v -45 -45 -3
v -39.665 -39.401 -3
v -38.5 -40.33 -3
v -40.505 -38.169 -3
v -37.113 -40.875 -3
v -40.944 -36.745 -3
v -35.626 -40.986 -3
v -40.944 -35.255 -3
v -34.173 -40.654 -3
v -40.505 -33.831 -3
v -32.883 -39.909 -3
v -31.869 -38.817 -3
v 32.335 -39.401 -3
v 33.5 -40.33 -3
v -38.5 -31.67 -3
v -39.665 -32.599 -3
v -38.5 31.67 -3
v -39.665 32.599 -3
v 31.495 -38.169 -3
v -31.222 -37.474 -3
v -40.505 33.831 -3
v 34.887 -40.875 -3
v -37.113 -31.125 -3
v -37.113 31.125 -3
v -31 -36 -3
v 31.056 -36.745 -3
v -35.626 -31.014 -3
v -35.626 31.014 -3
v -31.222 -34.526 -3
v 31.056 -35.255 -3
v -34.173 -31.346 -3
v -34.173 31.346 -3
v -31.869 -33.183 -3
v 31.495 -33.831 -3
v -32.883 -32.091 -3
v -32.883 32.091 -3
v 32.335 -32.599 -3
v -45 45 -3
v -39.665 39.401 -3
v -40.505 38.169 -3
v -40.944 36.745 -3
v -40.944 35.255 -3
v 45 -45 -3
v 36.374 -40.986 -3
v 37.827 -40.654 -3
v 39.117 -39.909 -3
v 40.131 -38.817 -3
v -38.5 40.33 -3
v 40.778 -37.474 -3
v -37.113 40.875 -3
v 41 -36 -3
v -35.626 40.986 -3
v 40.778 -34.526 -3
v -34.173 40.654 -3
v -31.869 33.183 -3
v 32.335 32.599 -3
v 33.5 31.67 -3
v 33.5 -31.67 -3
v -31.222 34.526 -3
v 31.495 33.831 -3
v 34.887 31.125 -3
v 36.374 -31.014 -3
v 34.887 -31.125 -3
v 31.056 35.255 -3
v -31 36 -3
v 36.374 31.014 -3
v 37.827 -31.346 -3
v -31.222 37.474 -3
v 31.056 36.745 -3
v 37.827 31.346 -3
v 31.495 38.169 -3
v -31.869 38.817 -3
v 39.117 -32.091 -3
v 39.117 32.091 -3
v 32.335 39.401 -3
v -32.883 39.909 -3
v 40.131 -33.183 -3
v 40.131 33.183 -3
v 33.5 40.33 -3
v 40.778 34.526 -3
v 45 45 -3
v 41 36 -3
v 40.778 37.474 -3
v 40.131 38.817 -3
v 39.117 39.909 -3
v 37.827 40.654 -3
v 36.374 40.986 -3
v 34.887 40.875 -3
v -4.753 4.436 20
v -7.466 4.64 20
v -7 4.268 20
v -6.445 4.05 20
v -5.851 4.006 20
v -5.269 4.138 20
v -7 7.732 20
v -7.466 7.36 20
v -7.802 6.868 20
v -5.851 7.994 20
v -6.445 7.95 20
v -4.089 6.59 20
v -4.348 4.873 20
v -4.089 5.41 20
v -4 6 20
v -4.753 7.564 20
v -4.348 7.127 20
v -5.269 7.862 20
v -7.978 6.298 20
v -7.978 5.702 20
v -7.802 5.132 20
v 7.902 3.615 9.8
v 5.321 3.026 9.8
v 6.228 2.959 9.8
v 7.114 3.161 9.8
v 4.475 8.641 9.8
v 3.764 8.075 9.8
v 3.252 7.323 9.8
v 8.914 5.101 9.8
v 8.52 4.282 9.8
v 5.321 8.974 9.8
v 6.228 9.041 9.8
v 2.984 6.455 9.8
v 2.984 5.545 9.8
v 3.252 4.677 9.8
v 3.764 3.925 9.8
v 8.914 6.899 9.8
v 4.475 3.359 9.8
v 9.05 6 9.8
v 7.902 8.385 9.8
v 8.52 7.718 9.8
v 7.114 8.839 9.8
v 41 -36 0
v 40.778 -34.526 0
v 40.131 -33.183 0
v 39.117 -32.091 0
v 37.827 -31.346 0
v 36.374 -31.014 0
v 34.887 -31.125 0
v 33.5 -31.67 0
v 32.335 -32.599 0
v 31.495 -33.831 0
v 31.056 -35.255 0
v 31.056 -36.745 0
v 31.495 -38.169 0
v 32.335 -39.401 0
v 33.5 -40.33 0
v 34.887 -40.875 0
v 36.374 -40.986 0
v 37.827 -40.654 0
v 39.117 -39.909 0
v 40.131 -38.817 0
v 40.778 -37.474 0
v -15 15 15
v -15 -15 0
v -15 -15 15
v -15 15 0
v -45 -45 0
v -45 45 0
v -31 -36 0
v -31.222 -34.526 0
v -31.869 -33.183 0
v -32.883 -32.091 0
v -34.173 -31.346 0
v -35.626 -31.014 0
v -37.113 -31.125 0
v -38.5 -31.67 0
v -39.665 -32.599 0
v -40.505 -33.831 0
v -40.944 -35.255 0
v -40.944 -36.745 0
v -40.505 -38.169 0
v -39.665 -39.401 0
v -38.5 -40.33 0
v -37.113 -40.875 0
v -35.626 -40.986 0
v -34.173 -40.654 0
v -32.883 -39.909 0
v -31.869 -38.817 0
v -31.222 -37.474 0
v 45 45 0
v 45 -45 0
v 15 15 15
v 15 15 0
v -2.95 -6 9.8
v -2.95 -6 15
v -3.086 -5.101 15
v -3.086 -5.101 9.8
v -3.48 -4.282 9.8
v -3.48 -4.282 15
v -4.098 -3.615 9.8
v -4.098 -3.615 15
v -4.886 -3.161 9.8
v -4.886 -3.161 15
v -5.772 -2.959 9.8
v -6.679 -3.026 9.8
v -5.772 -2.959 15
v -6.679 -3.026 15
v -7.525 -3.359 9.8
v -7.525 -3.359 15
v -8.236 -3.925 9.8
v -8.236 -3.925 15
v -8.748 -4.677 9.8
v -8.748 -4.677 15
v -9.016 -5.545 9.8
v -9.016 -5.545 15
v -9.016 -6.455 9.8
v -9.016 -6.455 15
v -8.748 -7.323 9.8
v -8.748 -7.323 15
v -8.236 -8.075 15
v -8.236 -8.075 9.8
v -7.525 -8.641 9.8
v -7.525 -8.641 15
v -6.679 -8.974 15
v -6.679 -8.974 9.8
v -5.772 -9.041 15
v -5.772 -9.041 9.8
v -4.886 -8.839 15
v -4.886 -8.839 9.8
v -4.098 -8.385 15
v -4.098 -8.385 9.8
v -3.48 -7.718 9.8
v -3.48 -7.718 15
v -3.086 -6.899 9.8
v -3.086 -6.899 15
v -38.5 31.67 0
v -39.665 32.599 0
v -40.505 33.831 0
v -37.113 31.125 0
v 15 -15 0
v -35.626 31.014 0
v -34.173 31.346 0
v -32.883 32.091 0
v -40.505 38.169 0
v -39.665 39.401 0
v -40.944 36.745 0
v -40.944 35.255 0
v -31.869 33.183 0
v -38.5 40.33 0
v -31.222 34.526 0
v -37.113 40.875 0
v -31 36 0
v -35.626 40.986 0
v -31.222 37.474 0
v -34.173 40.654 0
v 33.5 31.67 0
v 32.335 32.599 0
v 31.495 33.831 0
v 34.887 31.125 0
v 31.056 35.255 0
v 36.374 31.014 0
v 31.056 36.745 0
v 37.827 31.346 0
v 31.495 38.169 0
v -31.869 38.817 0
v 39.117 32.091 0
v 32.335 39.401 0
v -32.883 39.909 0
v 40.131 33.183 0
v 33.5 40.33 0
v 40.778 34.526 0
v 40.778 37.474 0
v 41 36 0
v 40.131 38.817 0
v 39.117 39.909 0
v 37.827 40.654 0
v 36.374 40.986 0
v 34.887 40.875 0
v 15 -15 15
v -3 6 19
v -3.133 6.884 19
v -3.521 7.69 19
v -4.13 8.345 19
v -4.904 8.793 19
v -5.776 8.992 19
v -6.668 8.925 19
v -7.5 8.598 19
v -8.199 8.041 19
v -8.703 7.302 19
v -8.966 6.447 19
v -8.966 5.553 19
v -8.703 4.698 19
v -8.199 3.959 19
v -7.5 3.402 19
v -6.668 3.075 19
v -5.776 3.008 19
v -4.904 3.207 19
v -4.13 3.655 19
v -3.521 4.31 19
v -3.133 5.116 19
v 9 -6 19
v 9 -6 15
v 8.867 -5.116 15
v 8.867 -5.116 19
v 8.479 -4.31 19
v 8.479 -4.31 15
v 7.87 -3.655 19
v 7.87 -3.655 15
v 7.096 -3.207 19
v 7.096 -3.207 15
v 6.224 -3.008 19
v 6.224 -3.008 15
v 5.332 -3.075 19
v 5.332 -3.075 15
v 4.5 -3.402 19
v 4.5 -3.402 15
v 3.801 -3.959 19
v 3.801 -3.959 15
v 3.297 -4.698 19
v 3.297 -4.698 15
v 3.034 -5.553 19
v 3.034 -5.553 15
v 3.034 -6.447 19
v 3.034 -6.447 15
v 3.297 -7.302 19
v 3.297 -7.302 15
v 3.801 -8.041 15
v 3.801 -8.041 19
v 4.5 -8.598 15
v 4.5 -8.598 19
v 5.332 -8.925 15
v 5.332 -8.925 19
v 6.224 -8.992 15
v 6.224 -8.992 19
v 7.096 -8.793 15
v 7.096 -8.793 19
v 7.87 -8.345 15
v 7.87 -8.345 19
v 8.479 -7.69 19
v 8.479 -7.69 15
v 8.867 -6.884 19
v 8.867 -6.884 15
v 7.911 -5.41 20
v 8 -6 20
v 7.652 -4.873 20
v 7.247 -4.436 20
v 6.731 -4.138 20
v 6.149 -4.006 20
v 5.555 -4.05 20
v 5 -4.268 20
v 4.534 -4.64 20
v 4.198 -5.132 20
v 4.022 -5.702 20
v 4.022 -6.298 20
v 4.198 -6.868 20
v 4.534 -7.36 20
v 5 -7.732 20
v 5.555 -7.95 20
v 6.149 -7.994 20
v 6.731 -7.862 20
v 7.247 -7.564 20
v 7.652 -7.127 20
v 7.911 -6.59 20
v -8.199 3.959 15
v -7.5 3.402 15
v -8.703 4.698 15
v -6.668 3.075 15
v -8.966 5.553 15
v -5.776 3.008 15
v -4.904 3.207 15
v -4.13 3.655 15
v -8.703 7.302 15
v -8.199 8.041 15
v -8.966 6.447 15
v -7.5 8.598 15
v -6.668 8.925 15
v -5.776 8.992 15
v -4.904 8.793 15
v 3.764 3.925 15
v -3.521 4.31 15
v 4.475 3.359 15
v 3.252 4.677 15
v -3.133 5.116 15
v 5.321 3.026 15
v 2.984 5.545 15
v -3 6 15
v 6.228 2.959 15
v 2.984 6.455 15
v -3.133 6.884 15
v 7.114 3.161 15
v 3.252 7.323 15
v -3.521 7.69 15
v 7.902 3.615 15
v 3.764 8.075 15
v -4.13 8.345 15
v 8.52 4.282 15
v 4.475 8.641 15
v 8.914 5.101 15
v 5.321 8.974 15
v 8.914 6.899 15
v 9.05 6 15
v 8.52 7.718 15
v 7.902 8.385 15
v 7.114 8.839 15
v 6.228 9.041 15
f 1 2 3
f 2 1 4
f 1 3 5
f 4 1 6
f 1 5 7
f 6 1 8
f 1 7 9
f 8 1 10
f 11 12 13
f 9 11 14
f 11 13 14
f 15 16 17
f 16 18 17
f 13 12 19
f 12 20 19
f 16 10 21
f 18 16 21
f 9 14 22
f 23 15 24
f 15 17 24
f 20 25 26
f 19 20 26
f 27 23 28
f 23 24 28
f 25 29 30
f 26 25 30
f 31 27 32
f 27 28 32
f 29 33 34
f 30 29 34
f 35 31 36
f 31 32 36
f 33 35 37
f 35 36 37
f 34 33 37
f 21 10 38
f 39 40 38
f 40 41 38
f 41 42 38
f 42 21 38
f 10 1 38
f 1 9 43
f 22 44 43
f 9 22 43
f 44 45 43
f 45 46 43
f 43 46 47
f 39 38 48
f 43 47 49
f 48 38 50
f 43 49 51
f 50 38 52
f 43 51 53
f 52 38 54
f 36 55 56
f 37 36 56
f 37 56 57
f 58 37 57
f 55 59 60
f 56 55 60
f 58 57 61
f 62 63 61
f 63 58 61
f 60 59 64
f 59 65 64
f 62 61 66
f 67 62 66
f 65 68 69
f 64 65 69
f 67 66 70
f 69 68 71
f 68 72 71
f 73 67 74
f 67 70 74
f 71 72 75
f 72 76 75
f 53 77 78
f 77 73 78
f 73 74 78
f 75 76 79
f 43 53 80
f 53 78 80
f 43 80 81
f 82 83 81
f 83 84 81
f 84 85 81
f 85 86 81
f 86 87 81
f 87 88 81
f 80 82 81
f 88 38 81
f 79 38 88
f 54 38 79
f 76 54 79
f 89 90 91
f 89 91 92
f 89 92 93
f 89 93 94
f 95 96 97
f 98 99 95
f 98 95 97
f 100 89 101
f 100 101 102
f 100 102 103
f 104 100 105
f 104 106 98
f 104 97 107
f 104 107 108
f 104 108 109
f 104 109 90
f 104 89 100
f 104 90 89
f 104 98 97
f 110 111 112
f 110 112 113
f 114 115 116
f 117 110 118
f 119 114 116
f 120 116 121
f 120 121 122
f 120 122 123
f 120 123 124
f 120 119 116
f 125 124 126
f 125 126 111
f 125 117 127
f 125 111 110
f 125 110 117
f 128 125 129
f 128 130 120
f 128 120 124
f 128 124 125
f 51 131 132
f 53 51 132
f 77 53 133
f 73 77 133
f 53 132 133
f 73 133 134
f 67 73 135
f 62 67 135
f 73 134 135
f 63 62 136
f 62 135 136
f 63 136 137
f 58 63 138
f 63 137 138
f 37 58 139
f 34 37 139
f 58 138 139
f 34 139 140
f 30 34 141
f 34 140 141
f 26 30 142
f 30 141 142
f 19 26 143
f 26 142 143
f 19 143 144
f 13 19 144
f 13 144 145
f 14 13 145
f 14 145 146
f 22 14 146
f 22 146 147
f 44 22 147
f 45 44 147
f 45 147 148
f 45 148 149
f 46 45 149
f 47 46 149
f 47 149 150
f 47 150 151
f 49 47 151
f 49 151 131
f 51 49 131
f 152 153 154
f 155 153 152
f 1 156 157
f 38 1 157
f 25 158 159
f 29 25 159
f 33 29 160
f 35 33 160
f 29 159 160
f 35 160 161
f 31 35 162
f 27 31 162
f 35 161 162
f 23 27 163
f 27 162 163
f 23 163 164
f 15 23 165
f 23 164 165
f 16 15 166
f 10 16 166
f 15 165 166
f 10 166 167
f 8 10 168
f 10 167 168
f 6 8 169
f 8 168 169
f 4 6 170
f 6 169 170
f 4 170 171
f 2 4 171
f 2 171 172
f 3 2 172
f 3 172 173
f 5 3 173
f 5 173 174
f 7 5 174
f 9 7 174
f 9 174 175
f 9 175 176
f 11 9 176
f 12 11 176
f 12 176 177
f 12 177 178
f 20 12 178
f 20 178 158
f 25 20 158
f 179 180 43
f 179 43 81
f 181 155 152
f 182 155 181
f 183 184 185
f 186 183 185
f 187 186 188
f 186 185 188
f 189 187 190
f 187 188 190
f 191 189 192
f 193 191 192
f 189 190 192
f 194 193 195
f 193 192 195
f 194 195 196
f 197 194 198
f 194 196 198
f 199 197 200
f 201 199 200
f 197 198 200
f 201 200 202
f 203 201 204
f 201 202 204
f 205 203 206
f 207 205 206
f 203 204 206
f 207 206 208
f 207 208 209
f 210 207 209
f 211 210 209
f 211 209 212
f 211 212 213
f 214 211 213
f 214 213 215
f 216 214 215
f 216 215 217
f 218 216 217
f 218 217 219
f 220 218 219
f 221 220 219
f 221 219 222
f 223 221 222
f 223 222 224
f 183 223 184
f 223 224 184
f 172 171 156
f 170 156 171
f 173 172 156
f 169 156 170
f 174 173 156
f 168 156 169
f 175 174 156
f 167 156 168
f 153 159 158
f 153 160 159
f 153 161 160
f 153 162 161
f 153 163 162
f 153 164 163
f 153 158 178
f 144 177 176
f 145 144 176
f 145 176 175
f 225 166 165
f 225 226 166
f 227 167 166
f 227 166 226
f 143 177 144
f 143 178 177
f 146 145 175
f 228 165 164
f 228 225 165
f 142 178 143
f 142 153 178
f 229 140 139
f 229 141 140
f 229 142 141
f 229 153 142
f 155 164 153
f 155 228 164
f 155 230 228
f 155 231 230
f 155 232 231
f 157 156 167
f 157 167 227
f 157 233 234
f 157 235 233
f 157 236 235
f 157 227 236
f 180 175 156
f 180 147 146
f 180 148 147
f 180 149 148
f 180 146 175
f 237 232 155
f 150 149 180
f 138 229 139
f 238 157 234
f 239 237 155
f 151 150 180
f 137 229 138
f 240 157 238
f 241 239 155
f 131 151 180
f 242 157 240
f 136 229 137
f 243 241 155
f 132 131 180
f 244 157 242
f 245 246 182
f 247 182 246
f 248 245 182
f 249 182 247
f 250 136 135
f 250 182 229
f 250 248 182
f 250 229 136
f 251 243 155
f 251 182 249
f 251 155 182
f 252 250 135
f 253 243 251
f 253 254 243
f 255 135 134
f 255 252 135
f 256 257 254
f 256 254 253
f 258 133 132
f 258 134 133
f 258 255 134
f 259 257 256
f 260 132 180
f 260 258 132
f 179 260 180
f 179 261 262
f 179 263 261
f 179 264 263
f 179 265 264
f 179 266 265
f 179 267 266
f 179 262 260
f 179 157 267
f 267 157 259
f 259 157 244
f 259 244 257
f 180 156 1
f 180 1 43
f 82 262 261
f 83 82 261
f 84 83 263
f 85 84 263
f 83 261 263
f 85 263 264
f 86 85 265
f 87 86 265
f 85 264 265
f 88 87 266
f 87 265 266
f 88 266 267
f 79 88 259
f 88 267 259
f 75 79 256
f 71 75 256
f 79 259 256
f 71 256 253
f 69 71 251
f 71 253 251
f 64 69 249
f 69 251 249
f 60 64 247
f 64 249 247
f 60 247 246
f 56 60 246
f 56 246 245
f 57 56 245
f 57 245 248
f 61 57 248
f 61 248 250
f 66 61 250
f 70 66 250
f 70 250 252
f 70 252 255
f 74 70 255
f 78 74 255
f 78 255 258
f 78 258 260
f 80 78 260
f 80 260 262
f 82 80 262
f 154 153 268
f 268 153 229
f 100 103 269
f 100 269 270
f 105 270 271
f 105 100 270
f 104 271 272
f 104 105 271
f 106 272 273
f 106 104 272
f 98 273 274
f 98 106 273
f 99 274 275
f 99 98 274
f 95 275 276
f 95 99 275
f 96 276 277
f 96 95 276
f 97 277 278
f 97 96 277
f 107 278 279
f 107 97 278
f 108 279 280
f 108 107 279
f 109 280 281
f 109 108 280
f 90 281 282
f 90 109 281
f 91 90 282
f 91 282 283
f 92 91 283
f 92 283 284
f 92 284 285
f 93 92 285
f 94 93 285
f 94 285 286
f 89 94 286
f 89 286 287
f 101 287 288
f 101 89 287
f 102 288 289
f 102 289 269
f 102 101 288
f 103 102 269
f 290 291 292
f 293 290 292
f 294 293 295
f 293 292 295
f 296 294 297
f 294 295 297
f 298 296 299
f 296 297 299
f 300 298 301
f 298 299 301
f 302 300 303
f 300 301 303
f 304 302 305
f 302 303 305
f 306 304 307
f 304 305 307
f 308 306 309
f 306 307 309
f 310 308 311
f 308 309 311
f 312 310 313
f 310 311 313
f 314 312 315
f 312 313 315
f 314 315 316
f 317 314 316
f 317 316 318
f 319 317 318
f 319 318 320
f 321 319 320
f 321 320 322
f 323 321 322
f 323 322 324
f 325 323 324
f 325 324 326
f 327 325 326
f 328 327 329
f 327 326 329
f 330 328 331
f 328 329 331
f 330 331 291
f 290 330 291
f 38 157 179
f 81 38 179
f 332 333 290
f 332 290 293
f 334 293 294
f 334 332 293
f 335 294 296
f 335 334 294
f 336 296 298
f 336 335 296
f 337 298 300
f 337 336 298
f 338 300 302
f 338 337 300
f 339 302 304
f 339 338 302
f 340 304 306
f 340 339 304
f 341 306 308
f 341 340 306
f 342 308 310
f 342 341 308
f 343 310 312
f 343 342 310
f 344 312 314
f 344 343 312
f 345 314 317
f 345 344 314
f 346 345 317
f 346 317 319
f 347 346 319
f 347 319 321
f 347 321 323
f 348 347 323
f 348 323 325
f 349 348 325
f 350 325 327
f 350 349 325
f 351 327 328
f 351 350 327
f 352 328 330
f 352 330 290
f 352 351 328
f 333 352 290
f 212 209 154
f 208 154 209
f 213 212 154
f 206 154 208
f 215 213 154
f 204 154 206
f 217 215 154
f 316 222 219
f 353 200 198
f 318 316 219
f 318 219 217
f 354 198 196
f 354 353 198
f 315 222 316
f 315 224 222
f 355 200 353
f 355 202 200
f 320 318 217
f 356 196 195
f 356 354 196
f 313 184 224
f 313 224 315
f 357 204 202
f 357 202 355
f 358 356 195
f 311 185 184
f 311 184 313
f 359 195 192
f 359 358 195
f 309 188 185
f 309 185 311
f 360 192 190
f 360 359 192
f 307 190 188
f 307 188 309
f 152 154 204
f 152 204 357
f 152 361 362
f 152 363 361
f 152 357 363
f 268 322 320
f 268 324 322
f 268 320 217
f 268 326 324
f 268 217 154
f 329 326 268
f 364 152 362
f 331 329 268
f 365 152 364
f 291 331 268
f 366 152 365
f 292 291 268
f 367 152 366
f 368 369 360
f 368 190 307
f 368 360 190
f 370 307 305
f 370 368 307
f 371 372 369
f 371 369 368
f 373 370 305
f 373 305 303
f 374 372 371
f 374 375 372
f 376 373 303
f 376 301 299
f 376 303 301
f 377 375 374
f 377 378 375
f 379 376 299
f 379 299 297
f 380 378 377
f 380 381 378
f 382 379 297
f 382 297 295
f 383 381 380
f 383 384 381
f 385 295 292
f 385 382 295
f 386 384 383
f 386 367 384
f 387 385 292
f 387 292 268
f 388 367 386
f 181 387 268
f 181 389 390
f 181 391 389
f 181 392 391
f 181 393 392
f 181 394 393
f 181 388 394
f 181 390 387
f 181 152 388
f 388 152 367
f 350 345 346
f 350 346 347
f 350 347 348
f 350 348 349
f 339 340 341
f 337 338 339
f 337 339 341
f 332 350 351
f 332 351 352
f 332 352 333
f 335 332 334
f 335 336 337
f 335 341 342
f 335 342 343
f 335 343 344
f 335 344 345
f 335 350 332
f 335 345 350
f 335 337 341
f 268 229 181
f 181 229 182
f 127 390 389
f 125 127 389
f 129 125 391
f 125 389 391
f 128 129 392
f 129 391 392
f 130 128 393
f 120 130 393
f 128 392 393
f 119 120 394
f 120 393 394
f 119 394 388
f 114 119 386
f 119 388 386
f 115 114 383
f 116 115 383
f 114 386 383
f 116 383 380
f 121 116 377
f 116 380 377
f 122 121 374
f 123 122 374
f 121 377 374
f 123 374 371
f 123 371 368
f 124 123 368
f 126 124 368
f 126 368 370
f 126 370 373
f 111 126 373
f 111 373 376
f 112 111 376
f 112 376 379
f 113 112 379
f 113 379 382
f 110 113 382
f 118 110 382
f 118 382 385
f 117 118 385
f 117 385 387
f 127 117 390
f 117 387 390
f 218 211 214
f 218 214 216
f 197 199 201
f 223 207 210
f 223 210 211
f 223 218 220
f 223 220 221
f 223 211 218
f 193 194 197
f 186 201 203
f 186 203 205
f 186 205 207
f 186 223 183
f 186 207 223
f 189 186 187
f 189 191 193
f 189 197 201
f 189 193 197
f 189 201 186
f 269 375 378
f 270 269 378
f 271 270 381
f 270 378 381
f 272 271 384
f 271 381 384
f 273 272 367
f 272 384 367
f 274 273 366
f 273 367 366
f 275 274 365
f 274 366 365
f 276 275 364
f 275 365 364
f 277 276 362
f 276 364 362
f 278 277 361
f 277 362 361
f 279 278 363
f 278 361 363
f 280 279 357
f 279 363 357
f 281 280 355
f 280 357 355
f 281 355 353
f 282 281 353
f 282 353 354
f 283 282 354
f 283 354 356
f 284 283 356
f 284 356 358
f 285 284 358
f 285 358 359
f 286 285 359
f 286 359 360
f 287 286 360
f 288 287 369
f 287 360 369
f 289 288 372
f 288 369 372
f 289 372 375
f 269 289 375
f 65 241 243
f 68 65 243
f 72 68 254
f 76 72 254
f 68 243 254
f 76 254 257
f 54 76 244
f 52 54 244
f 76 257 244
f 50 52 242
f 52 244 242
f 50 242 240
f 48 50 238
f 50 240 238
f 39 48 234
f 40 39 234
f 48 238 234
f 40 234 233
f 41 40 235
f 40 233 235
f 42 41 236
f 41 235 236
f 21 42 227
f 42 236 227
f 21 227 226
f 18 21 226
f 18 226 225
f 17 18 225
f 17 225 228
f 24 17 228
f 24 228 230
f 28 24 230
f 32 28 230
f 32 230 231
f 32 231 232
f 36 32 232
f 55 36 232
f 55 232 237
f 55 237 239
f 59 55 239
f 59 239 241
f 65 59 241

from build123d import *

# Parameters (mm, degrees)
F0_W      = 30
F0_H      = 30
F1_DEPTH  = 15
F2_W      = 90
F2_H      = 90
F3_DEPTH  = 3
F4_R      = 5
F5_DEPTH  = 3.001
F6_R      = 3
F7_DEPTH  = 5
F8_SIZE   = 1
F9_R      = 3.05
F10_DEPTH = 5.2


with BuildPart() as f1:
    # F0 (on Top) → F1 (new body)
    with BuildSketch(Plane.XY):
        Rectangle(F0_W, F0_H)
    extrude(amount=F1_DEPTH)

    # F2 (on Top) → F3 (join)
    with BuildSketch(Plane.XY):
        Rectangle(F2_W, F2_H)
    extrude(amount=-F3_DEPTH)

    # F4 (on face) → F5 (cut, through all)
    with BuildSketch(Plane.XY):
        with Locations((-36, 36)):
            Circle(F4_R)
        with Locations((36, 36)):
            Circle(F4_R)
        with Locations((36, -36)):
            Circle(F4_R)
        with Locations((-36, -36)):
            Circle(F4_R)
    extrude(amount=-F5_DEPTH, mode=Mode.SUBTRACT)

    # F6 (on face) → F7 (join)
    with BuildSketch(Plane.XY.offset(15)):
        with Locations((-6, 6)):
            Circle(F6_R)
        with Locations((6, -6)):
            Circle(F6_R)
    extrude(amount=F7_DEPTH)

    # F8
    f8_edges = [f1.edges().sort_by_distance(p)[0] for p in [
        (-9, 6, 20),
        (3, -6, 20),
    ]]
    chamfer(f8_edges, length=F8_SIZE)

    # F9 (on face) → F10 (cut)
    with BuildSketch(Plane.XY.offset(15)):
        with Locations((-6, -6)):
            Circle(F9_R)
        with Locations((6, 6)):
            Circle(F9_R)
    extrude(amount=-F10_DEPTH, mode=Mode.SUBTRACT)


solid = f1.part
